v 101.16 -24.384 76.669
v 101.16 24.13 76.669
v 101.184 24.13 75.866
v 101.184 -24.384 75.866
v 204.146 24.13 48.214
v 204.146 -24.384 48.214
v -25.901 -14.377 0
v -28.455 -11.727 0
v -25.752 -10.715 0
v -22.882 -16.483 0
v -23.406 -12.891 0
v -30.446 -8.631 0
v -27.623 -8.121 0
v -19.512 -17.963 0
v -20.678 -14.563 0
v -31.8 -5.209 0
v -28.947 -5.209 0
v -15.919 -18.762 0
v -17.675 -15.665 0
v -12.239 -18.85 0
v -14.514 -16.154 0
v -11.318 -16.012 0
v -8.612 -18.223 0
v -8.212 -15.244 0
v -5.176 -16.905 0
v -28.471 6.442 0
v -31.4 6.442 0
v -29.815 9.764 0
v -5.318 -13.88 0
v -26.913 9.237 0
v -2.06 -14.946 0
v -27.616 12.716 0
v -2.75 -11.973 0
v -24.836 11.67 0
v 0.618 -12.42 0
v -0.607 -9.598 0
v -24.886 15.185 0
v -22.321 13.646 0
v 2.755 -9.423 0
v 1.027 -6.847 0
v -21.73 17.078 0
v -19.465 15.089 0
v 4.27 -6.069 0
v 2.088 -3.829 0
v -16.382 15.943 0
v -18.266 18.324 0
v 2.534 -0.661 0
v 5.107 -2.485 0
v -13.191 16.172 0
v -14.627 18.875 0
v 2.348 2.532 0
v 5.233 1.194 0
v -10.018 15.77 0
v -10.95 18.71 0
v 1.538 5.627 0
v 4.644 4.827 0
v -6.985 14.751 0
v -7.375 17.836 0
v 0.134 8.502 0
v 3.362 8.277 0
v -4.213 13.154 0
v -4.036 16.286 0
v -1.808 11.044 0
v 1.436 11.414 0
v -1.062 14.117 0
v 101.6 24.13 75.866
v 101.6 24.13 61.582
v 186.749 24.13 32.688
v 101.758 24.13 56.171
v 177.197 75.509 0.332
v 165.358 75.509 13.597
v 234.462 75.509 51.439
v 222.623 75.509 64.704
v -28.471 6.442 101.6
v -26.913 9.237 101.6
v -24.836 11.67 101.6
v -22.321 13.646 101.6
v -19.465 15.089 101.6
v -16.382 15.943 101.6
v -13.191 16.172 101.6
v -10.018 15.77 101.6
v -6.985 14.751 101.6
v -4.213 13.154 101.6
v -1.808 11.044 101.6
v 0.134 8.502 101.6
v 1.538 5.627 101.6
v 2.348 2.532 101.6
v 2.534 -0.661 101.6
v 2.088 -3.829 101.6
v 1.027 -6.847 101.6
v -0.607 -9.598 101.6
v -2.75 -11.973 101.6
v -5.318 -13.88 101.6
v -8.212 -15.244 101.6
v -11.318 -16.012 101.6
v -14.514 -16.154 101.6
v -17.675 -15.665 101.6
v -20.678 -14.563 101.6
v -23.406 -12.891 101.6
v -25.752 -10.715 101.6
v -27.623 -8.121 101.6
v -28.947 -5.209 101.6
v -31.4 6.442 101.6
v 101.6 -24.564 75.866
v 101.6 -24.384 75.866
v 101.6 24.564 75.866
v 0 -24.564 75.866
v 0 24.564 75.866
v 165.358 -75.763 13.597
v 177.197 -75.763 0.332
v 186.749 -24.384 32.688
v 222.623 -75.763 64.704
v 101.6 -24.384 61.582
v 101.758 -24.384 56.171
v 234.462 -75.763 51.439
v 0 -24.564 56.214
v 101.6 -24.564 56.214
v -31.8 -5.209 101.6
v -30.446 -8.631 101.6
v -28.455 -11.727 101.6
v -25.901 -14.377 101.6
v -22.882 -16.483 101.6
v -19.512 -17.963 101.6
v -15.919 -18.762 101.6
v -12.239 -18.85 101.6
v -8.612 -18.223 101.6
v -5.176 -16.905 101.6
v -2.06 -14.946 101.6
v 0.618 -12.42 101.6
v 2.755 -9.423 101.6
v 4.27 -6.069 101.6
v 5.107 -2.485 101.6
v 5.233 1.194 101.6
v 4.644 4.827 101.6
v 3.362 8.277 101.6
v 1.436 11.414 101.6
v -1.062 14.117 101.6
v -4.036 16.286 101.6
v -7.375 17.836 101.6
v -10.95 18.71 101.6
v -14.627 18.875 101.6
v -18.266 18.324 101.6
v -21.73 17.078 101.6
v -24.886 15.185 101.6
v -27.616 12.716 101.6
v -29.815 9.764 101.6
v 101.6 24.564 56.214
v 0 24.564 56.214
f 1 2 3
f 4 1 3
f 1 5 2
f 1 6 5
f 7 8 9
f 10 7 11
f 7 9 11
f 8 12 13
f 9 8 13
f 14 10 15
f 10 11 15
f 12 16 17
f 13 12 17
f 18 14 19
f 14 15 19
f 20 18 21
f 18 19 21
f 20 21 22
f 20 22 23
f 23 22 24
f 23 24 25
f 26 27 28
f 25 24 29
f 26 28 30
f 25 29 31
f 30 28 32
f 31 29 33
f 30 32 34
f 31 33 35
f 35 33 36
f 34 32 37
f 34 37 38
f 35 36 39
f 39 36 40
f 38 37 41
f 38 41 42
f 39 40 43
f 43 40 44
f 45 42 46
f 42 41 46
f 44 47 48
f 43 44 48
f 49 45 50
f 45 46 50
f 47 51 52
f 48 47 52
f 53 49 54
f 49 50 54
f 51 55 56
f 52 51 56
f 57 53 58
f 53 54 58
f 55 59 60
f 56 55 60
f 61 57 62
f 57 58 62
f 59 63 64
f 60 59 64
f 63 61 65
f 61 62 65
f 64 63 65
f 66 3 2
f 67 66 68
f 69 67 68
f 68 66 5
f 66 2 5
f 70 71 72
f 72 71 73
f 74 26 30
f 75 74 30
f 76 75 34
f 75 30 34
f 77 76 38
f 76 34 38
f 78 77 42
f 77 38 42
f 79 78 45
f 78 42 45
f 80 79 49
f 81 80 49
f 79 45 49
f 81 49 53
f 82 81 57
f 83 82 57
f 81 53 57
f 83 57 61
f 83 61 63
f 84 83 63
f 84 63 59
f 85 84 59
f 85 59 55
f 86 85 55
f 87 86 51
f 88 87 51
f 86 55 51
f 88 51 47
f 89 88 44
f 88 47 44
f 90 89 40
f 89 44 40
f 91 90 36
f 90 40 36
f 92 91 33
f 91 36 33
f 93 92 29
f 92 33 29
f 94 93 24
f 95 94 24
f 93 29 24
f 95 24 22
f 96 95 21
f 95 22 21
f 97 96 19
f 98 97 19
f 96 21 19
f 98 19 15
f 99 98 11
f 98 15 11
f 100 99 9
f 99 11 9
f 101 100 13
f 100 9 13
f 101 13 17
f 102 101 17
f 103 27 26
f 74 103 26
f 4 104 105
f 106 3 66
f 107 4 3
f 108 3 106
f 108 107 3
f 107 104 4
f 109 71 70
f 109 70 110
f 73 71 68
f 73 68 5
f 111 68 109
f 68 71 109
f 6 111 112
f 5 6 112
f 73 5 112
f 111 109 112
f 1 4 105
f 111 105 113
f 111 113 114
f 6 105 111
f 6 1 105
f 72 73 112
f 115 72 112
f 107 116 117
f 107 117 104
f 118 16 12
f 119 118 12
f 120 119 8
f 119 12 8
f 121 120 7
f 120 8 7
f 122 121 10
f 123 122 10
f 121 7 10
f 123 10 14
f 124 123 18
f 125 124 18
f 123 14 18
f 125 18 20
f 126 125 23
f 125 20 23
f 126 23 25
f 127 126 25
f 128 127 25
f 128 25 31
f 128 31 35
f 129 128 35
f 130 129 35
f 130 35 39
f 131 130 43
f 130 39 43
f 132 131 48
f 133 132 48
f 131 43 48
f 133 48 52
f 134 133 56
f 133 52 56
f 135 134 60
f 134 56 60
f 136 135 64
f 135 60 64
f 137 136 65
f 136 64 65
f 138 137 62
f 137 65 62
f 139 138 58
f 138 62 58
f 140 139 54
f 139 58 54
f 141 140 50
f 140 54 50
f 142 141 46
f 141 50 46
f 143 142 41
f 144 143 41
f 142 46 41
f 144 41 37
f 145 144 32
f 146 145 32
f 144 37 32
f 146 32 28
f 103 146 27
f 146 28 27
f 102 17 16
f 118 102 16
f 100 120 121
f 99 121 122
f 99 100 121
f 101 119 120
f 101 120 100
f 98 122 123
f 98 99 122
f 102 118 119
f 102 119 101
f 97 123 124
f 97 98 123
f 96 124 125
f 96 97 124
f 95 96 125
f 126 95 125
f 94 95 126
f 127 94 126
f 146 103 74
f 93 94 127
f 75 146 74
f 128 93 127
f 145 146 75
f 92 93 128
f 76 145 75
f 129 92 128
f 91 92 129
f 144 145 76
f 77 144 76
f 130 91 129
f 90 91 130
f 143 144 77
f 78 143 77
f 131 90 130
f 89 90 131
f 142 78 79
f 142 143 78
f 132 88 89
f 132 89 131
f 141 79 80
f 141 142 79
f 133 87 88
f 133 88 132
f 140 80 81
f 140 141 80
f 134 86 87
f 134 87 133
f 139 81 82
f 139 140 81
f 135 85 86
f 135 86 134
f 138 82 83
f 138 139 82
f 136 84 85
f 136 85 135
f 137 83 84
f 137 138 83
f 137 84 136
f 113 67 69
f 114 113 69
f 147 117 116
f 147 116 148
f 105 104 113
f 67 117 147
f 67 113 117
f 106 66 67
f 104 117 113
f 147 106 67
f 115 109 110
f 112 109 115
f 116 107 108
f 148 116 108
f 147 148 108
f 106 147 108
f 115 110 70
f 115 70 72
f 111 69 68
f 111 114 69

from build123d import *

# Parameters (mm, degrees)
F1_DEPTH      = 101.6
F2_W          = 49.1289459169
F2_H          = 19.6515806019
F3_DEPTH      = 101.6
F5_DEPTH      = 24.384
F5_DEPTH_BACK = 24.13
F6_W          = 76.7547786236
F6_H          = 151.2725003281
F7_DEPTH      = 17.78


with BuildPart() as f1:
    # F0 (on Top) → F1 (new body)
    with BuildSketch(Plane.XY):
        with BuildLine():
            ThreePointArc((-28.4708873967, 6.4422843053), (2.5342810256, -0.6612460253), (-28.9474863047, -5.2086560369))
            Line((-28.9474863047, -5.2086560369), (-31.8002136599, -5.2086560369))
            ThreePointArc((-31.8002136599, -5.2086560369), (5.2598383056, -0.6484164442), (-31.4002926231, 6.4422843053))
            Line((-31.4002926231, 6.4422843053), (-28.4708873967, 6.4422843053))
        make_face()
    extrude(amount=F1_DEPTH)


with BuildPart() as f3:
    # F2 (on Right) → F3 (new body)
    with BuildSketch(Plane.YZ):
        with Locations((-1.8626e-06, 66.039999947)):
            Rectangle(F2_W, F2_H)
    extrude(amount=F3_DEPTH)

    # F4 (on Front) → F5 (join, two sides)
    with BuildSketch(Plane.XZ) as f5_sk:
        Polygon((101.1604294181, 76.6693279147), (101.7576307058, 56.1712905765), (186.7493391037, 32.6881110668), (204.1463260814, 48.2143604374), align=None)
    extrude(amount=F5_DEPTH)
    extrude(f5_sk.sketch, amount=-F5_DEPTH_BACK)

    # F6 (on face) → F7 (join)
    with BuildSketch(Plane(origin=(66.5586422689, 0, -74.5782065698), x_dir=(0.7460819854, 0, 0.6658540914), z_dir=(0.6658540914, 0, -0.7460819854))):
        with Locations((170.8016097546, 0.127)):
            Rectangle(F6_W, F6_H)
    extrude(amount=F7_DEPTH)


solid = Compound([f1.part, f3.part])
